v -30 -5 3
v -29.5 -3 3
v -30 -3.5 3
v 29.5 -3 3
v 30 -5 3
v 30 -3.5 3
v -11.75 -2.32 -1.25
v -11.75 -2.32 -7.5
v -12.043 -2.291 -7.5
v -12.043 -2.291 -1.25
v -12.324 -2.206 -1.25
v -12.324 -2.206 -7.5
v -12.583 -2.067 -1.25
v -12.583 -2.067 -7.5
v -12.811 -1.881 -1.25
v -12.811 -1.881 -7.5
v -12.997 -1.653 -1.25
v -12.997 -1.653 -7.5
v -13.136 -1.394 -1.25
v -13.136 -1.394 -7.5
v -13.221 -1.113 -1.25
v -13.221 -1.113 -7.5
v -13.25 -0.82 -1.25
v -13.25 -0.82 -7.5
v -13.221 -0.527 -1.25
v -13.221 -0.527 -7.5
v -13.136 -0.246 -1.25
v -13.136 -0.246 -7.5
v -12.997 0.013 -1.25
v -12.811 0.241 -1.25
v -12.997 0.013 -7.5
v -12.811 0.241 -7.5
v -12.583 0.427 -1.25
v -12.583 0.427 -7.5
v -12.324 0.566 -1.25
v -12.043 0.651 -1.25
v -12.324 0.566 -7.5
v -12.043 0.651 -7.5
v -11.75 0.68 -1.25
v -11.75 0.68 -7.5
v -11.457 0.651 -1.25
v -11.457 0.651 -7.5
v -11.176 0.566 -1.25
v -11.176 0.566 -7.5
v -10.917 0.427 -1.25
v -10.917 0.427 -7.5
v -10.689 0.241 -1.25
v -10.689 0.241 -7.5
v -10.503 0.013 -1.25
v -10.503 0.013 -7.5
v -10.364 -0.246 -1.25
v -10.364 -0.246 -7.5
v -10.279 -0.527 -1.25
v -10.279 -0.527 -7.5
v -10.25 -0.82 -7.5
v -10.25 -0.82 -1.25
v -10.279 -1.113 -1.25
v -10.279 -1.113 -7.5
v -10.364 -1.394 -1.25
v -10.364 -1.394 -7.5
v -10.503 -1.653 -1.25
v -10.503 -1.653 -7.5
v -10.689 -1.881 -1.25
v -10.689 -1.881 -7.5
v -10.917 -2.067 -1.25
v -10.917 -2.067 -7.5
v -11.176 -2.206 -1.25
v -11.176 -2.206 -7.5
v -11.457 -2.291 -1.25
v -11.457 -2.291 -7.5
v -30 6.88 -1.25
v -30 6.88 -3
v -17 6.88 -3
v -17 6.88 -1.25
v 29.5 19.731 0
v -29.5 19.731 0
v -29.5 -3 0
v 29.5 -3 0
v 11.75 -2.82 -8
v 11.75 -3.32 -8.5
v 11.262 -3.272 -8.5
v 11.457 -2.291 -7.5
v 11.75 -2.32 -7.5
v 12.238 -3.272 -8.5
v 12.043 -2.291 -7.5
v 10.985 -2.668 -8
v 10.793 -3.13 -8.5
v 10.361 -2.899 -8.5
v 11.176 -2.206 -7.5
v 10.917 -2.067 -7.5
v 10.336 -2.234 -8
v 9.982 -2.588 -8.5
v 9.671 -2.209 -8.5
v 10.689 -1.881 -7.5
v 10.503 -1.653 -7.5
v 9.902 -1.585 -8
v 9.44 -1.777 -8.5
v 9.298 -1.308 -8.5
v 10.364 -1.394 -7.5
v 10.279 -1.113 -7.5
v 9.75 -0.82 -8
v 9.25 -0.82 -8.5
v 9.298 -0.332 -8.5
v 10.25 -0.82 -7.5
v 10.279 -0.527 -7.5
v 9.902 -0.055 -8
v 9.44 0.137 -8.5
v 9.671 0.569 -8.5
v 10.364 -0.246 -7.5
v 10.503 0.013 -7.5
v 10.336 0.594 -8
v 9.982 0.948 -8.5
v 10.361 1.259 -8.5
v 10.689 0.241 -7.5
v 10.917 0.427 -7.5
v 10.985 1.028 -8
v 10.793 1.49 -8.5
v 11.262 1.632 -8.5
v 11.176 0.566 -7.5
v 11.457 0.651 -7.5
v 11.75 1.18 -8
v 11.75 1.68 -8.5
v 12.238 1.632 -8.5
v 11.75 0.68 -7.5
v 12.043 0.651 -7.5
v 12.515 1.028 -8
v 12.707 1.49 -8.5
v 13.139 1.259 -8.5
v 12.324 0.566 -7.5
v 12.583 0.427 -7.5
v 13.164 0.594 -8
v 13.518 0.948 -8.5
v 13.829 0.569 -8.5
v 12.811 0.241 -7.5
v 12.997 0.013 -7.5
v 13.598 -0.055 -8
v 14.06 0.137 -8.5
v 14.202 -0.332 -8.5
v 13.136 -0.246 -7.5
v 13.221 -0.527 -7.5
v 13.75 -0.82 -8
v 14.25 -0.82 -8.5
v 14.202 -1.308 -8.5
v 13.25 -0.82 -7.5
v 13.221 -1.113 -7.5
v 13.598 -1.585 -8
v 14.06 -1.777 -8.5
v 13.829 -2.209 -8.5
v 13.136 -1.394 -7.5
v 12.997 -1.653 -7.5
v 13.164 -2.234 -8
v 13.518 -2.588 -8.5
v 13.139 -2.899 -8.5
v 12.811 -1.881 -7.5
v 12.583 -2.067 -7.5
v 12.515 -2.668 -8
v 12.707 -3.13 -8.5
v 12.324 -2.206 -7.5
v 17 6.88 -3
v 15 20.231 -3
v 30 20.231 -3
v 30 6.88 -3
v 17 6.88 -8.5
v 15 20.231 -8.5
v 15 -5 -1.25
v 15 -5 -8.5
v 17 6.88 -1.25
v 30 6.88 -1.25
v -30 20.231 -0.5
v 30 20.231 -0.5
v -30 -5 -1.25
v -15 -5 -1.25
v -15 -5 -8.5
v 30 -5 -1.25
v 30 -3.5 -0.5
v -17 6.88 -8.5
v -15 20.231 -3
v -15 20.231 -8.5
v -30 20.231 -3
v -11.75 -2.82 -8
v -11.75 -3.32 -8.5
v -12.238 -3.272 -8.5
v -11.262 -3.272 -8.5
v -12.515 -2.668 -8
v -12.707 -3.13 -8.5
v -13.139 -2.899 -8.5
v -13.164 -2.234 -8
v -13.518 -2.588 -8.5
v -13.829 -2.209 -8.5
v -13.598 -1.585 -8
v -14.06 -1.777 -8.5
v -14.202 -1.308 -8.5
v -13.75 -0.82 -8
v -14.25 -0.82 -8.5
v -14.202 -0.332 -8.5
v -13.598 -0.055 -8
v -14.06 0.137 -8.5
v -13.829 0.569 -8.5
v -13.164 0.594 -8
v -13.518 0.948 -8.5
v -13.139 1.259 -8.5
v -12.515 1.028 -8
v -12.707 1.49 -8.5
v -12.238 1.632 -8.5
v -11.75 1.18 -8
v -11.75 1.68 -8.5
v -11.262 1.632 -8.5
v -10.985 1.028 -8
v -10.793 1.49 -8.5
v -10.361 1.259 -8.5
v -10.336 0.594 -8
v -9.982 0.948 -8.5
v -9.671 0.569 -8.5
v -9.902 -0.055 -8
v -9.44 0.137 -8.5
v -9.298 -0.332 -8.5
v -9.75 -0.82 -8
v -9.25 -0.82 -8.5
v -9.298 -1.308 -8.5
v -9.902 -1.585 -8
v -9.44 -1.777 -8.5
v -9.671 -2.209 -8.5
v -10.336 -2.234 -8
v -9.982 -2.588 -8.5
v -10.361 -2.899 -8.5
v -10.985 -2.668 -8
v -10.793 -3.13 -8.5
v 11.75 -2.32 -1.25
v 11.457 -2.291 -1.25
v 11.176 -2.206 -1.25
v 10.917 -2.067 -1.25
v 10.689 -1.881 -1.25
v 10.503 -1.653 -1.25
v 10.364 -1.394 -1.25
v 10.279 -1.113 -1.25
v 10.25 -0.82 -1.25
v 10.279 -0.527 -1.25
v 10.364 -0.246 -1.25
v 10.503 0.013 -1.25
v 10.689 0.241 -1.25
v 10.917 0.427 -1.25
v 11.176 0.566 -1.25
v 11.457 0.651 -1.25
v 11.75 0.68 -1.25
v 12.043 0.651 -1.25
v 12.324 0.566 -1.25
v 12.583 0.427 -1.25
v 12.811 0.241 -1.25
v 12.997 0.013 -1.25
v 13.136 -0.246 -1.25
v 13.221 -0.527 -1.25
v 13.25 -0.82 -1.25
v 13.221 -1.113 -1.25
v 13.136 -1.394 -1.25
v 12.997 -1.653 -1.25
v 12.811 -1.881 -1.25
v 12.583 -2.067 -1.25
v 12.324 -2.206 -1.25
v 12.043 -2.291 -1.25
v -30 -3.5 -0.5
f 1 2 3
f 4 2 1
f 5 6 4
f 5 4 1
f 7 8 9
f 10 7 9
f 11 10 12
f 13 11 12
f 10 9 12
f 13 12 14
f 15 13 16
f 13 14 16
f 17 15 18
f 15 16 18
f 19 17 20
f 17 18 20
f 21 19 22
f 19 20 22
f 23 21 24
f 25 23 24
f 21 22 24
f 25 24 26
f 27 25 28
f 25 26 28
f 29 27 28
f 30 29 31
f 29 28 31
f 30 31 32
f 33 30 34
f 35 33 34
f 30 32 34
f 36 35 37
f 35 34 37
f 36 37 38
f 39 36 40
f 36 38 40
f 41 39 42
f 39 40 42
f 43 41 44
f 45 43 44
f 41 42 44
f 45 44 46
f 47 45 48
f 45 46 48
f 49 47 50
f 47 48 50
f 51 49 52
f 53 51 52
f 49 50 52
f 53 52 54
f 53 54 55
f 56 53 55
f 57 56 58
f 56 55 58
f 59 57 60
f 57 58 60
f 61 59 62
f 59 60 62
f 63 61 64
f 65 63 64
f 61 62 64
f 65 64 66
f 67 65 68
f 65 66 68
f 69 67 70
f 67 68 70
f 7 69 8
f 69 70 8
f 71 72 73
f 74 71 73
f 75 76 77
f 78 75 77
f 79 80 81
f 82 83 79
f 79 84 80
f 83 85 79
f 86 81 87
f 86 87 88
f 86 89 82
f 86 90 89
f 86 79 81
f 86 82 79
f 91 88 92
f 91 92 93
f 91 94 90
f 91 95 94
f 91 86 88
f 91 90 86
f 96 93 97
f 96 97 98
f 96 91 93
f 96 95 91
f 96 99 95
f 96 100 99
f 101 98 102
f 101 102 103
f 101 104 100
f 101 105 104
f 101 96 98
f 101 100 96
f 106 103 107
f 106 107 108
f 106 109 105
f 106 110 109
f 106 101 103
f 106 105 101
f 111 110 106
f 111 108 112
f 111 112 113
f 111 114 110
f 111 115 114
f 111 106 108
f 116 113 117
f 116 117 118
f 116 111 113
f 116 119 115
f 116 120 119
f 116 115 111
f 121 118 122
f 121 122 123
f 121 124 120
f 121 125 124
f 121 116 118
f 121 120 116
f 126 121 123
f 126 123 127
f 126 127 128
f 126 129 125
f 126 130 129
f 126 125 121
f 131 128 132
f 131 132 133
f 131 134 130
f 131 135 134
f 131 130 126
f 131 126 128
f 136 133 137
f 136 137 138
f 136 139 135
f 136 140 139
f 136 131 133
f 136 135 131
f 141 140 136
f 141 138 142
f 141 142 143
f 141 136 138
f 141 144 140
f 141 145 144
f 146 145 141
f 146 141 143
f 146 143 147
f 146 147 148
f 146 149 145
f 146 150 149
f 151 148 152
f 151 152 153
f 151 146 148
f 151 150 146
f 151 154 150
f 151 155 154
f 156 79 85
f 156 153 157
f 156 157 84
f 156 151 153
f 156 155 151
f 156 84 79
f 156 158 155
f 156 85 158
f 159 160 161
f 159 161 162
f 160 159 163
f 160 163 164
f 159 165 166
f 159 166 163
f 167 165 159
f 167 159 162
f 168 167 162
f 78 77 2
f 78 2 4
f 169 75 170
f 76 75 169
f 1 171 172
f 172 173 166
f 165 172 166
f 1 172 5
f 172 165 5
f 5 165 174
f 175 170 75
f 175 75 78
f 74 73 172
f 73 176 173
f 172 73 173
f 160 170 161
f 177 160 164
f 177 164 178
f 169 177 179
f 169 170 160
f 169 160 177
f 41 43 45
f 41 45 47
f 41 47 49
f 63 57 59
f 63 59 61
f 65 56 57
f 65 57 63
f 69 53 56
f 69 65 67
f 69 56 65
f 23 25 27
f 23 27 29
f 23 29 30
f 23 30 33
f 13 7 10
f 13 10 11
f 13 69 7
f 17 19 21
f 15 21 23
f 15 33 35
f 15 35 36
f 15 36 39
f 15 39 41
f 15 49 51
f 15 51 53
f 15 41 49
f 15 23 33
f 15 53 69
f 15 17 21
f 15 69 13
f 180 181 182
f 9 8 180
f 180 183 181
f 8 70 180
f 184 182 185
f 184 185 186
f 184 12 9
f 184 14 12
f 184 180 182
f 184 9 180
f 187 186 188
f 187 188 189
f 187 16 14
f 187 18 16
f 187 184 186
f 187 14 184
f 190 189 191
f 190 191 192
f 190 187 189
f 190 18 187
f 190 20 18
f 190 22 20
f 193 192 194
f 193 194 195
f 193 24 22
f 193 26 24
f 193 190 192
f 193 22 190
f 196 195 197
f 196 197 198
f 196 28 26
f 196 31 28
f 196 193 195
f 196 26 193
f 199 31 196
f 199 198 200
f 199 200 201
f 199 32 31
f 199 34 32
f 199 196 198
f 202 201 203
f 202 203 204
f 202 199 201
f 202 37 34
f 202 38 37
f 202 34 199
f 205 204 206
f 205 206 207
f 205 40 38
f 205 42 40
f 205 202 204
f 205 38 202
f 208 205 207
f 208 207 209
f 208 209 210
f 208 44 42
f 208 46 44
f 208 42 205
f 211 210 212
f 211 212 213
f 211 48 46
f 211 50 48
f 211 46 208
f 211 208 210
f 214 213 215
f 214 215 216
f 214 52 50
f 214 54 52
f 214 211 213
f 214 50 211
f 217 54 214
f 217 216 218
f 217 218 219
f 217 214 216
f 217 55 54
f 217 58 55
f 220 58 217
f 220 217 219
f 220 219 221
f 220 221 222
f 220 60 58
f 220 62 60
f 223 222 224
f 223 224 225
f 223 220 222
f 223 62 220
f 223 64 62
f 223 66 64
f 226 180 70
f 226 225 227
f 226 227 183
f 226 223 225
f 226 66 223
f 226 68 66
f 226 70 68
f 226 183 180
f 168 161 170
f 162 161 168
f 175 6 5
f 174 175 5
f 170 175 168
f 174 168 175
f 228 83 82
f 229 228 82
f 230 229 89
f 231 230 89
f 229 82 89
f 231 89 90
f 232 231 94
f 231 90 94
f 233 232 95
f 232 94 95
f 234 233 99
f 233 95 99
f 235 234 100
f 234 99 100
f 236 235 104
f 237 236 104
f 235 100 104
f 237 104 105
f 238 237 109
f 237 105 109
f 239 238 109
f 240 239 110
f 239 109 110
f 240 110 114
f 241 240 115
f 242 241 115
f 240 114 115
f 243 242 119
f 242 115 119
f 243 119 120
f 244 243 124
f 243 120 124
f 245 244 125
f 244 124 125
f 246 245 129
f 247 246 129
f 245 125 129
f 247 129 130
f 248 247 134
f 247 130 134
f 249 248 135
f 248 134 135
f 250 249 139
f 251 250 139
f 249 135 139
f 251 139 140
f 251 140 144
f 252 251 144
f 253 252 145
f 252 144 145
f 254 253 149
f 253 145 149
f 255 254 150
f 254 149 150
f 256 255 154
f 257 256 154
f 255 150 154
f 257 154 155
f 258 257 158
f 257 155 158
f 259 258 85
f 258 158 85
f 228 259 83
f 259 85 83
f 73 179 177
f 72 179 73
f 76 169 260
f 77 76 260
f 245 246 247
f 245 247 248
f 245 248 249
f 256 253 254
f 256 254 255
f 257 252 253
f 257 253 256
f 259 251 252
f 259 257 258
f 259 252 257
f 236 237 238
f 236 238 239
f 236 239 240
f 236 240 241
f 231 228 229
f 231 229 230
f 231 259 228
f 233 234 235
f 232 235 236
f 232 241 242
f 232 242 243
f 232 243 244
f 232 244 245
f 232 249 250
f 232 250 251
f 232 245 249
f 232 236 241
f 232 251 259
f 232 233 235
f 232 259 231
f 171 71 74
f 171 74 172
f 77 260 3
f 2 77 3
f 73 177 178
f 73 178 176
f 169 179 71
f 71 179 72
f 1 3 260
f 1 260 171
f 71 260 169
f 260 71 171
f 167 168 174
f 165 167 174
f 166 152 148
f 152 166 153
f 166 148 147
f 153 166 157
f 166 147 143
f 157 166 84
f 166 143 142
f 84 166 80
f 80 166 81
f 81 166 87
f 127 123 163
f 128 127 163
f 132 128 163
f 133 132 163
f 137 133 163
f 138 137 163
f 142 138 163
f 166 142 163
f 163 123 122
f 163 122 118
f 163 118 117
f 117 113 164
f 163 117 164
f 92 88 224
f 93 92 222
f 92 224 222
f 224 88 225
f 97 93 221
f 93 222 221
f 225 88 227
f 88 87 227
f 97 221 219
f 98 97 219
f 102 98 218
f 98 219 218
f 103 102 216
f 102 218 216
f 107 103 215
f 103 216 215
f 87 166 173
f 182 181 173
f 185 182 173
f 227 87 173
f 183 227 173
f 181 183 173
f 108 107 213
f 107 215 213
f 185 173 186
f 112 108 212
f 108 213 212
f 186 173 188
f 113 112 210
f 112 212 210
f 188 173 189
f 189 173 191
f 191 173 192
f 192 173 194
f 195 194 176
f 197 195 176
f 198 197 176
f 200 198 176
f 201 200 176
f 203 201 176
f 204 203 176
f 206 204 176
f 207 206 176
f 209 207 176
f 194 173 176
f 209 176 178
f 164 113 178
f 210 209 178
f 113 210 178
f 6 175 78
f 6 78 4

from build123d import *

# Parameters (mm, degrees)
SKETCH025_W          = 25.23103
SKETCH025_H          = 60
PAD004_DEPTH         = 3
PAD005_DEPTH         = 5.5
SKETCH027_R          = 1.5
POCKET005_DEPTH      = 7.25
SKETCH028_W          = 2
SKETCH028_H          = 60
PAD006_DEPTH         = 3
POCKET006_DEPTH      = 1.75
CHAMFER003_SIZE      = 0.5
CHAMFER004_SIZE      = 1
BODY_ROLL_ANGLE      = -180
BODY_PLACEMENT_ANGLE = -90


with BuildPart() as part:
    # Sketch025 → Pad004 (new body)
    with BuildSketch(Plane.XY):
        with Locations((-10.615515, 0)):
            Rectangle(SKETCH025_W, SKETCH025_H)
    extrude(amount=PAD004_DEPTH)

    # Sketch026 (on Face6 of Pad004) → Pad005 (join)
    with BuildSketch(Plane.XY.offset(3)):
        Polygon((-23.23103, 15), (-9.88, 17), (2, 15), (2, -15), (-9.88, -17), (-23.23103, -15), align=None)
    extrude(amount=PAD005_DEPTH)

    # Sketch027 (on Face12 of Pad005) → Pocket005 (cut)
    with BuildSketch(Plane.XY.offset(8.5)):
        with Locations((-2.18, 11.75)):
            Circle(SKETCH027_R)
        with Locations((-2.18, -11.75)):
            Circle(SKETCH027_R)
    extrude(amount=-POCKET005_DEPTH, mode=Mode.SUBTRACT)

    # Sketch028 (on Face4 of Pocket005) → Pad006 (join)
    with BuildSketch(Plane(origin=(0, 0, 0), x_dir=(1, 0, 0), z_dir=(0, 0, -1))):
        with Locations((1, 0)):
            Rectangle(SKETCH028_W, SKETCH028_H)
    extrude(amount=PAD006_DEPTH)

    # Sketch029 (on Face9 of Pad006) → Pocket006 (cut)
    with BuildSketch(Plane.XY.offset(3)):
        Polygon((2, 30), (-9.88, 30), (-9.88, 17), (2, 15), align=None)
        Polygon((2, -30), (2, -15), (-9.88, -17), (-9.88, -30), align=None)
    extrude(amount=-POCKET006_DEPTH, mode=Mode.SUBTRACT)

    # Chamfer003
    chamfer003_edges = [part.edges().sort_by_distance(p)[0] for p in [
        (0, 30, -1.5),
        (0, -30, -1.5),
        (-11.615515, 30, 0),
        (-23.23103, 0, 0),
        (-11.615515, -30, 0),
    ]]
    chamfer(chamfer003_edges, length=CHAMFER003_SIZE)

    # Chamfer004
    chamfer004_edges = [part.edges().sort_by_distance(p)[0] for p in [
        (-3.68, -11.75, 8.5),
        (-3.68, 11.75, 8.5),
    ]]
    chamfer(chamfer004_edges, length=CHAMFER004_SIZE)


with BuildPart() as part_1:
    # Body roll: moved
    add(part.part.rotate(Axis((0, 0, 0), (1, 0, 0)), BODY_ROLL_ANGLE))


with BuildPart() as part_2:
    # Body placement: moved
    add(part_1.part.moved(Location((0, -3, 0))).rotate(Axis((0, -3, 0), (0, 0, 1)), BODY_PLACEMENT_ANGLE))


solid = part_2.part
